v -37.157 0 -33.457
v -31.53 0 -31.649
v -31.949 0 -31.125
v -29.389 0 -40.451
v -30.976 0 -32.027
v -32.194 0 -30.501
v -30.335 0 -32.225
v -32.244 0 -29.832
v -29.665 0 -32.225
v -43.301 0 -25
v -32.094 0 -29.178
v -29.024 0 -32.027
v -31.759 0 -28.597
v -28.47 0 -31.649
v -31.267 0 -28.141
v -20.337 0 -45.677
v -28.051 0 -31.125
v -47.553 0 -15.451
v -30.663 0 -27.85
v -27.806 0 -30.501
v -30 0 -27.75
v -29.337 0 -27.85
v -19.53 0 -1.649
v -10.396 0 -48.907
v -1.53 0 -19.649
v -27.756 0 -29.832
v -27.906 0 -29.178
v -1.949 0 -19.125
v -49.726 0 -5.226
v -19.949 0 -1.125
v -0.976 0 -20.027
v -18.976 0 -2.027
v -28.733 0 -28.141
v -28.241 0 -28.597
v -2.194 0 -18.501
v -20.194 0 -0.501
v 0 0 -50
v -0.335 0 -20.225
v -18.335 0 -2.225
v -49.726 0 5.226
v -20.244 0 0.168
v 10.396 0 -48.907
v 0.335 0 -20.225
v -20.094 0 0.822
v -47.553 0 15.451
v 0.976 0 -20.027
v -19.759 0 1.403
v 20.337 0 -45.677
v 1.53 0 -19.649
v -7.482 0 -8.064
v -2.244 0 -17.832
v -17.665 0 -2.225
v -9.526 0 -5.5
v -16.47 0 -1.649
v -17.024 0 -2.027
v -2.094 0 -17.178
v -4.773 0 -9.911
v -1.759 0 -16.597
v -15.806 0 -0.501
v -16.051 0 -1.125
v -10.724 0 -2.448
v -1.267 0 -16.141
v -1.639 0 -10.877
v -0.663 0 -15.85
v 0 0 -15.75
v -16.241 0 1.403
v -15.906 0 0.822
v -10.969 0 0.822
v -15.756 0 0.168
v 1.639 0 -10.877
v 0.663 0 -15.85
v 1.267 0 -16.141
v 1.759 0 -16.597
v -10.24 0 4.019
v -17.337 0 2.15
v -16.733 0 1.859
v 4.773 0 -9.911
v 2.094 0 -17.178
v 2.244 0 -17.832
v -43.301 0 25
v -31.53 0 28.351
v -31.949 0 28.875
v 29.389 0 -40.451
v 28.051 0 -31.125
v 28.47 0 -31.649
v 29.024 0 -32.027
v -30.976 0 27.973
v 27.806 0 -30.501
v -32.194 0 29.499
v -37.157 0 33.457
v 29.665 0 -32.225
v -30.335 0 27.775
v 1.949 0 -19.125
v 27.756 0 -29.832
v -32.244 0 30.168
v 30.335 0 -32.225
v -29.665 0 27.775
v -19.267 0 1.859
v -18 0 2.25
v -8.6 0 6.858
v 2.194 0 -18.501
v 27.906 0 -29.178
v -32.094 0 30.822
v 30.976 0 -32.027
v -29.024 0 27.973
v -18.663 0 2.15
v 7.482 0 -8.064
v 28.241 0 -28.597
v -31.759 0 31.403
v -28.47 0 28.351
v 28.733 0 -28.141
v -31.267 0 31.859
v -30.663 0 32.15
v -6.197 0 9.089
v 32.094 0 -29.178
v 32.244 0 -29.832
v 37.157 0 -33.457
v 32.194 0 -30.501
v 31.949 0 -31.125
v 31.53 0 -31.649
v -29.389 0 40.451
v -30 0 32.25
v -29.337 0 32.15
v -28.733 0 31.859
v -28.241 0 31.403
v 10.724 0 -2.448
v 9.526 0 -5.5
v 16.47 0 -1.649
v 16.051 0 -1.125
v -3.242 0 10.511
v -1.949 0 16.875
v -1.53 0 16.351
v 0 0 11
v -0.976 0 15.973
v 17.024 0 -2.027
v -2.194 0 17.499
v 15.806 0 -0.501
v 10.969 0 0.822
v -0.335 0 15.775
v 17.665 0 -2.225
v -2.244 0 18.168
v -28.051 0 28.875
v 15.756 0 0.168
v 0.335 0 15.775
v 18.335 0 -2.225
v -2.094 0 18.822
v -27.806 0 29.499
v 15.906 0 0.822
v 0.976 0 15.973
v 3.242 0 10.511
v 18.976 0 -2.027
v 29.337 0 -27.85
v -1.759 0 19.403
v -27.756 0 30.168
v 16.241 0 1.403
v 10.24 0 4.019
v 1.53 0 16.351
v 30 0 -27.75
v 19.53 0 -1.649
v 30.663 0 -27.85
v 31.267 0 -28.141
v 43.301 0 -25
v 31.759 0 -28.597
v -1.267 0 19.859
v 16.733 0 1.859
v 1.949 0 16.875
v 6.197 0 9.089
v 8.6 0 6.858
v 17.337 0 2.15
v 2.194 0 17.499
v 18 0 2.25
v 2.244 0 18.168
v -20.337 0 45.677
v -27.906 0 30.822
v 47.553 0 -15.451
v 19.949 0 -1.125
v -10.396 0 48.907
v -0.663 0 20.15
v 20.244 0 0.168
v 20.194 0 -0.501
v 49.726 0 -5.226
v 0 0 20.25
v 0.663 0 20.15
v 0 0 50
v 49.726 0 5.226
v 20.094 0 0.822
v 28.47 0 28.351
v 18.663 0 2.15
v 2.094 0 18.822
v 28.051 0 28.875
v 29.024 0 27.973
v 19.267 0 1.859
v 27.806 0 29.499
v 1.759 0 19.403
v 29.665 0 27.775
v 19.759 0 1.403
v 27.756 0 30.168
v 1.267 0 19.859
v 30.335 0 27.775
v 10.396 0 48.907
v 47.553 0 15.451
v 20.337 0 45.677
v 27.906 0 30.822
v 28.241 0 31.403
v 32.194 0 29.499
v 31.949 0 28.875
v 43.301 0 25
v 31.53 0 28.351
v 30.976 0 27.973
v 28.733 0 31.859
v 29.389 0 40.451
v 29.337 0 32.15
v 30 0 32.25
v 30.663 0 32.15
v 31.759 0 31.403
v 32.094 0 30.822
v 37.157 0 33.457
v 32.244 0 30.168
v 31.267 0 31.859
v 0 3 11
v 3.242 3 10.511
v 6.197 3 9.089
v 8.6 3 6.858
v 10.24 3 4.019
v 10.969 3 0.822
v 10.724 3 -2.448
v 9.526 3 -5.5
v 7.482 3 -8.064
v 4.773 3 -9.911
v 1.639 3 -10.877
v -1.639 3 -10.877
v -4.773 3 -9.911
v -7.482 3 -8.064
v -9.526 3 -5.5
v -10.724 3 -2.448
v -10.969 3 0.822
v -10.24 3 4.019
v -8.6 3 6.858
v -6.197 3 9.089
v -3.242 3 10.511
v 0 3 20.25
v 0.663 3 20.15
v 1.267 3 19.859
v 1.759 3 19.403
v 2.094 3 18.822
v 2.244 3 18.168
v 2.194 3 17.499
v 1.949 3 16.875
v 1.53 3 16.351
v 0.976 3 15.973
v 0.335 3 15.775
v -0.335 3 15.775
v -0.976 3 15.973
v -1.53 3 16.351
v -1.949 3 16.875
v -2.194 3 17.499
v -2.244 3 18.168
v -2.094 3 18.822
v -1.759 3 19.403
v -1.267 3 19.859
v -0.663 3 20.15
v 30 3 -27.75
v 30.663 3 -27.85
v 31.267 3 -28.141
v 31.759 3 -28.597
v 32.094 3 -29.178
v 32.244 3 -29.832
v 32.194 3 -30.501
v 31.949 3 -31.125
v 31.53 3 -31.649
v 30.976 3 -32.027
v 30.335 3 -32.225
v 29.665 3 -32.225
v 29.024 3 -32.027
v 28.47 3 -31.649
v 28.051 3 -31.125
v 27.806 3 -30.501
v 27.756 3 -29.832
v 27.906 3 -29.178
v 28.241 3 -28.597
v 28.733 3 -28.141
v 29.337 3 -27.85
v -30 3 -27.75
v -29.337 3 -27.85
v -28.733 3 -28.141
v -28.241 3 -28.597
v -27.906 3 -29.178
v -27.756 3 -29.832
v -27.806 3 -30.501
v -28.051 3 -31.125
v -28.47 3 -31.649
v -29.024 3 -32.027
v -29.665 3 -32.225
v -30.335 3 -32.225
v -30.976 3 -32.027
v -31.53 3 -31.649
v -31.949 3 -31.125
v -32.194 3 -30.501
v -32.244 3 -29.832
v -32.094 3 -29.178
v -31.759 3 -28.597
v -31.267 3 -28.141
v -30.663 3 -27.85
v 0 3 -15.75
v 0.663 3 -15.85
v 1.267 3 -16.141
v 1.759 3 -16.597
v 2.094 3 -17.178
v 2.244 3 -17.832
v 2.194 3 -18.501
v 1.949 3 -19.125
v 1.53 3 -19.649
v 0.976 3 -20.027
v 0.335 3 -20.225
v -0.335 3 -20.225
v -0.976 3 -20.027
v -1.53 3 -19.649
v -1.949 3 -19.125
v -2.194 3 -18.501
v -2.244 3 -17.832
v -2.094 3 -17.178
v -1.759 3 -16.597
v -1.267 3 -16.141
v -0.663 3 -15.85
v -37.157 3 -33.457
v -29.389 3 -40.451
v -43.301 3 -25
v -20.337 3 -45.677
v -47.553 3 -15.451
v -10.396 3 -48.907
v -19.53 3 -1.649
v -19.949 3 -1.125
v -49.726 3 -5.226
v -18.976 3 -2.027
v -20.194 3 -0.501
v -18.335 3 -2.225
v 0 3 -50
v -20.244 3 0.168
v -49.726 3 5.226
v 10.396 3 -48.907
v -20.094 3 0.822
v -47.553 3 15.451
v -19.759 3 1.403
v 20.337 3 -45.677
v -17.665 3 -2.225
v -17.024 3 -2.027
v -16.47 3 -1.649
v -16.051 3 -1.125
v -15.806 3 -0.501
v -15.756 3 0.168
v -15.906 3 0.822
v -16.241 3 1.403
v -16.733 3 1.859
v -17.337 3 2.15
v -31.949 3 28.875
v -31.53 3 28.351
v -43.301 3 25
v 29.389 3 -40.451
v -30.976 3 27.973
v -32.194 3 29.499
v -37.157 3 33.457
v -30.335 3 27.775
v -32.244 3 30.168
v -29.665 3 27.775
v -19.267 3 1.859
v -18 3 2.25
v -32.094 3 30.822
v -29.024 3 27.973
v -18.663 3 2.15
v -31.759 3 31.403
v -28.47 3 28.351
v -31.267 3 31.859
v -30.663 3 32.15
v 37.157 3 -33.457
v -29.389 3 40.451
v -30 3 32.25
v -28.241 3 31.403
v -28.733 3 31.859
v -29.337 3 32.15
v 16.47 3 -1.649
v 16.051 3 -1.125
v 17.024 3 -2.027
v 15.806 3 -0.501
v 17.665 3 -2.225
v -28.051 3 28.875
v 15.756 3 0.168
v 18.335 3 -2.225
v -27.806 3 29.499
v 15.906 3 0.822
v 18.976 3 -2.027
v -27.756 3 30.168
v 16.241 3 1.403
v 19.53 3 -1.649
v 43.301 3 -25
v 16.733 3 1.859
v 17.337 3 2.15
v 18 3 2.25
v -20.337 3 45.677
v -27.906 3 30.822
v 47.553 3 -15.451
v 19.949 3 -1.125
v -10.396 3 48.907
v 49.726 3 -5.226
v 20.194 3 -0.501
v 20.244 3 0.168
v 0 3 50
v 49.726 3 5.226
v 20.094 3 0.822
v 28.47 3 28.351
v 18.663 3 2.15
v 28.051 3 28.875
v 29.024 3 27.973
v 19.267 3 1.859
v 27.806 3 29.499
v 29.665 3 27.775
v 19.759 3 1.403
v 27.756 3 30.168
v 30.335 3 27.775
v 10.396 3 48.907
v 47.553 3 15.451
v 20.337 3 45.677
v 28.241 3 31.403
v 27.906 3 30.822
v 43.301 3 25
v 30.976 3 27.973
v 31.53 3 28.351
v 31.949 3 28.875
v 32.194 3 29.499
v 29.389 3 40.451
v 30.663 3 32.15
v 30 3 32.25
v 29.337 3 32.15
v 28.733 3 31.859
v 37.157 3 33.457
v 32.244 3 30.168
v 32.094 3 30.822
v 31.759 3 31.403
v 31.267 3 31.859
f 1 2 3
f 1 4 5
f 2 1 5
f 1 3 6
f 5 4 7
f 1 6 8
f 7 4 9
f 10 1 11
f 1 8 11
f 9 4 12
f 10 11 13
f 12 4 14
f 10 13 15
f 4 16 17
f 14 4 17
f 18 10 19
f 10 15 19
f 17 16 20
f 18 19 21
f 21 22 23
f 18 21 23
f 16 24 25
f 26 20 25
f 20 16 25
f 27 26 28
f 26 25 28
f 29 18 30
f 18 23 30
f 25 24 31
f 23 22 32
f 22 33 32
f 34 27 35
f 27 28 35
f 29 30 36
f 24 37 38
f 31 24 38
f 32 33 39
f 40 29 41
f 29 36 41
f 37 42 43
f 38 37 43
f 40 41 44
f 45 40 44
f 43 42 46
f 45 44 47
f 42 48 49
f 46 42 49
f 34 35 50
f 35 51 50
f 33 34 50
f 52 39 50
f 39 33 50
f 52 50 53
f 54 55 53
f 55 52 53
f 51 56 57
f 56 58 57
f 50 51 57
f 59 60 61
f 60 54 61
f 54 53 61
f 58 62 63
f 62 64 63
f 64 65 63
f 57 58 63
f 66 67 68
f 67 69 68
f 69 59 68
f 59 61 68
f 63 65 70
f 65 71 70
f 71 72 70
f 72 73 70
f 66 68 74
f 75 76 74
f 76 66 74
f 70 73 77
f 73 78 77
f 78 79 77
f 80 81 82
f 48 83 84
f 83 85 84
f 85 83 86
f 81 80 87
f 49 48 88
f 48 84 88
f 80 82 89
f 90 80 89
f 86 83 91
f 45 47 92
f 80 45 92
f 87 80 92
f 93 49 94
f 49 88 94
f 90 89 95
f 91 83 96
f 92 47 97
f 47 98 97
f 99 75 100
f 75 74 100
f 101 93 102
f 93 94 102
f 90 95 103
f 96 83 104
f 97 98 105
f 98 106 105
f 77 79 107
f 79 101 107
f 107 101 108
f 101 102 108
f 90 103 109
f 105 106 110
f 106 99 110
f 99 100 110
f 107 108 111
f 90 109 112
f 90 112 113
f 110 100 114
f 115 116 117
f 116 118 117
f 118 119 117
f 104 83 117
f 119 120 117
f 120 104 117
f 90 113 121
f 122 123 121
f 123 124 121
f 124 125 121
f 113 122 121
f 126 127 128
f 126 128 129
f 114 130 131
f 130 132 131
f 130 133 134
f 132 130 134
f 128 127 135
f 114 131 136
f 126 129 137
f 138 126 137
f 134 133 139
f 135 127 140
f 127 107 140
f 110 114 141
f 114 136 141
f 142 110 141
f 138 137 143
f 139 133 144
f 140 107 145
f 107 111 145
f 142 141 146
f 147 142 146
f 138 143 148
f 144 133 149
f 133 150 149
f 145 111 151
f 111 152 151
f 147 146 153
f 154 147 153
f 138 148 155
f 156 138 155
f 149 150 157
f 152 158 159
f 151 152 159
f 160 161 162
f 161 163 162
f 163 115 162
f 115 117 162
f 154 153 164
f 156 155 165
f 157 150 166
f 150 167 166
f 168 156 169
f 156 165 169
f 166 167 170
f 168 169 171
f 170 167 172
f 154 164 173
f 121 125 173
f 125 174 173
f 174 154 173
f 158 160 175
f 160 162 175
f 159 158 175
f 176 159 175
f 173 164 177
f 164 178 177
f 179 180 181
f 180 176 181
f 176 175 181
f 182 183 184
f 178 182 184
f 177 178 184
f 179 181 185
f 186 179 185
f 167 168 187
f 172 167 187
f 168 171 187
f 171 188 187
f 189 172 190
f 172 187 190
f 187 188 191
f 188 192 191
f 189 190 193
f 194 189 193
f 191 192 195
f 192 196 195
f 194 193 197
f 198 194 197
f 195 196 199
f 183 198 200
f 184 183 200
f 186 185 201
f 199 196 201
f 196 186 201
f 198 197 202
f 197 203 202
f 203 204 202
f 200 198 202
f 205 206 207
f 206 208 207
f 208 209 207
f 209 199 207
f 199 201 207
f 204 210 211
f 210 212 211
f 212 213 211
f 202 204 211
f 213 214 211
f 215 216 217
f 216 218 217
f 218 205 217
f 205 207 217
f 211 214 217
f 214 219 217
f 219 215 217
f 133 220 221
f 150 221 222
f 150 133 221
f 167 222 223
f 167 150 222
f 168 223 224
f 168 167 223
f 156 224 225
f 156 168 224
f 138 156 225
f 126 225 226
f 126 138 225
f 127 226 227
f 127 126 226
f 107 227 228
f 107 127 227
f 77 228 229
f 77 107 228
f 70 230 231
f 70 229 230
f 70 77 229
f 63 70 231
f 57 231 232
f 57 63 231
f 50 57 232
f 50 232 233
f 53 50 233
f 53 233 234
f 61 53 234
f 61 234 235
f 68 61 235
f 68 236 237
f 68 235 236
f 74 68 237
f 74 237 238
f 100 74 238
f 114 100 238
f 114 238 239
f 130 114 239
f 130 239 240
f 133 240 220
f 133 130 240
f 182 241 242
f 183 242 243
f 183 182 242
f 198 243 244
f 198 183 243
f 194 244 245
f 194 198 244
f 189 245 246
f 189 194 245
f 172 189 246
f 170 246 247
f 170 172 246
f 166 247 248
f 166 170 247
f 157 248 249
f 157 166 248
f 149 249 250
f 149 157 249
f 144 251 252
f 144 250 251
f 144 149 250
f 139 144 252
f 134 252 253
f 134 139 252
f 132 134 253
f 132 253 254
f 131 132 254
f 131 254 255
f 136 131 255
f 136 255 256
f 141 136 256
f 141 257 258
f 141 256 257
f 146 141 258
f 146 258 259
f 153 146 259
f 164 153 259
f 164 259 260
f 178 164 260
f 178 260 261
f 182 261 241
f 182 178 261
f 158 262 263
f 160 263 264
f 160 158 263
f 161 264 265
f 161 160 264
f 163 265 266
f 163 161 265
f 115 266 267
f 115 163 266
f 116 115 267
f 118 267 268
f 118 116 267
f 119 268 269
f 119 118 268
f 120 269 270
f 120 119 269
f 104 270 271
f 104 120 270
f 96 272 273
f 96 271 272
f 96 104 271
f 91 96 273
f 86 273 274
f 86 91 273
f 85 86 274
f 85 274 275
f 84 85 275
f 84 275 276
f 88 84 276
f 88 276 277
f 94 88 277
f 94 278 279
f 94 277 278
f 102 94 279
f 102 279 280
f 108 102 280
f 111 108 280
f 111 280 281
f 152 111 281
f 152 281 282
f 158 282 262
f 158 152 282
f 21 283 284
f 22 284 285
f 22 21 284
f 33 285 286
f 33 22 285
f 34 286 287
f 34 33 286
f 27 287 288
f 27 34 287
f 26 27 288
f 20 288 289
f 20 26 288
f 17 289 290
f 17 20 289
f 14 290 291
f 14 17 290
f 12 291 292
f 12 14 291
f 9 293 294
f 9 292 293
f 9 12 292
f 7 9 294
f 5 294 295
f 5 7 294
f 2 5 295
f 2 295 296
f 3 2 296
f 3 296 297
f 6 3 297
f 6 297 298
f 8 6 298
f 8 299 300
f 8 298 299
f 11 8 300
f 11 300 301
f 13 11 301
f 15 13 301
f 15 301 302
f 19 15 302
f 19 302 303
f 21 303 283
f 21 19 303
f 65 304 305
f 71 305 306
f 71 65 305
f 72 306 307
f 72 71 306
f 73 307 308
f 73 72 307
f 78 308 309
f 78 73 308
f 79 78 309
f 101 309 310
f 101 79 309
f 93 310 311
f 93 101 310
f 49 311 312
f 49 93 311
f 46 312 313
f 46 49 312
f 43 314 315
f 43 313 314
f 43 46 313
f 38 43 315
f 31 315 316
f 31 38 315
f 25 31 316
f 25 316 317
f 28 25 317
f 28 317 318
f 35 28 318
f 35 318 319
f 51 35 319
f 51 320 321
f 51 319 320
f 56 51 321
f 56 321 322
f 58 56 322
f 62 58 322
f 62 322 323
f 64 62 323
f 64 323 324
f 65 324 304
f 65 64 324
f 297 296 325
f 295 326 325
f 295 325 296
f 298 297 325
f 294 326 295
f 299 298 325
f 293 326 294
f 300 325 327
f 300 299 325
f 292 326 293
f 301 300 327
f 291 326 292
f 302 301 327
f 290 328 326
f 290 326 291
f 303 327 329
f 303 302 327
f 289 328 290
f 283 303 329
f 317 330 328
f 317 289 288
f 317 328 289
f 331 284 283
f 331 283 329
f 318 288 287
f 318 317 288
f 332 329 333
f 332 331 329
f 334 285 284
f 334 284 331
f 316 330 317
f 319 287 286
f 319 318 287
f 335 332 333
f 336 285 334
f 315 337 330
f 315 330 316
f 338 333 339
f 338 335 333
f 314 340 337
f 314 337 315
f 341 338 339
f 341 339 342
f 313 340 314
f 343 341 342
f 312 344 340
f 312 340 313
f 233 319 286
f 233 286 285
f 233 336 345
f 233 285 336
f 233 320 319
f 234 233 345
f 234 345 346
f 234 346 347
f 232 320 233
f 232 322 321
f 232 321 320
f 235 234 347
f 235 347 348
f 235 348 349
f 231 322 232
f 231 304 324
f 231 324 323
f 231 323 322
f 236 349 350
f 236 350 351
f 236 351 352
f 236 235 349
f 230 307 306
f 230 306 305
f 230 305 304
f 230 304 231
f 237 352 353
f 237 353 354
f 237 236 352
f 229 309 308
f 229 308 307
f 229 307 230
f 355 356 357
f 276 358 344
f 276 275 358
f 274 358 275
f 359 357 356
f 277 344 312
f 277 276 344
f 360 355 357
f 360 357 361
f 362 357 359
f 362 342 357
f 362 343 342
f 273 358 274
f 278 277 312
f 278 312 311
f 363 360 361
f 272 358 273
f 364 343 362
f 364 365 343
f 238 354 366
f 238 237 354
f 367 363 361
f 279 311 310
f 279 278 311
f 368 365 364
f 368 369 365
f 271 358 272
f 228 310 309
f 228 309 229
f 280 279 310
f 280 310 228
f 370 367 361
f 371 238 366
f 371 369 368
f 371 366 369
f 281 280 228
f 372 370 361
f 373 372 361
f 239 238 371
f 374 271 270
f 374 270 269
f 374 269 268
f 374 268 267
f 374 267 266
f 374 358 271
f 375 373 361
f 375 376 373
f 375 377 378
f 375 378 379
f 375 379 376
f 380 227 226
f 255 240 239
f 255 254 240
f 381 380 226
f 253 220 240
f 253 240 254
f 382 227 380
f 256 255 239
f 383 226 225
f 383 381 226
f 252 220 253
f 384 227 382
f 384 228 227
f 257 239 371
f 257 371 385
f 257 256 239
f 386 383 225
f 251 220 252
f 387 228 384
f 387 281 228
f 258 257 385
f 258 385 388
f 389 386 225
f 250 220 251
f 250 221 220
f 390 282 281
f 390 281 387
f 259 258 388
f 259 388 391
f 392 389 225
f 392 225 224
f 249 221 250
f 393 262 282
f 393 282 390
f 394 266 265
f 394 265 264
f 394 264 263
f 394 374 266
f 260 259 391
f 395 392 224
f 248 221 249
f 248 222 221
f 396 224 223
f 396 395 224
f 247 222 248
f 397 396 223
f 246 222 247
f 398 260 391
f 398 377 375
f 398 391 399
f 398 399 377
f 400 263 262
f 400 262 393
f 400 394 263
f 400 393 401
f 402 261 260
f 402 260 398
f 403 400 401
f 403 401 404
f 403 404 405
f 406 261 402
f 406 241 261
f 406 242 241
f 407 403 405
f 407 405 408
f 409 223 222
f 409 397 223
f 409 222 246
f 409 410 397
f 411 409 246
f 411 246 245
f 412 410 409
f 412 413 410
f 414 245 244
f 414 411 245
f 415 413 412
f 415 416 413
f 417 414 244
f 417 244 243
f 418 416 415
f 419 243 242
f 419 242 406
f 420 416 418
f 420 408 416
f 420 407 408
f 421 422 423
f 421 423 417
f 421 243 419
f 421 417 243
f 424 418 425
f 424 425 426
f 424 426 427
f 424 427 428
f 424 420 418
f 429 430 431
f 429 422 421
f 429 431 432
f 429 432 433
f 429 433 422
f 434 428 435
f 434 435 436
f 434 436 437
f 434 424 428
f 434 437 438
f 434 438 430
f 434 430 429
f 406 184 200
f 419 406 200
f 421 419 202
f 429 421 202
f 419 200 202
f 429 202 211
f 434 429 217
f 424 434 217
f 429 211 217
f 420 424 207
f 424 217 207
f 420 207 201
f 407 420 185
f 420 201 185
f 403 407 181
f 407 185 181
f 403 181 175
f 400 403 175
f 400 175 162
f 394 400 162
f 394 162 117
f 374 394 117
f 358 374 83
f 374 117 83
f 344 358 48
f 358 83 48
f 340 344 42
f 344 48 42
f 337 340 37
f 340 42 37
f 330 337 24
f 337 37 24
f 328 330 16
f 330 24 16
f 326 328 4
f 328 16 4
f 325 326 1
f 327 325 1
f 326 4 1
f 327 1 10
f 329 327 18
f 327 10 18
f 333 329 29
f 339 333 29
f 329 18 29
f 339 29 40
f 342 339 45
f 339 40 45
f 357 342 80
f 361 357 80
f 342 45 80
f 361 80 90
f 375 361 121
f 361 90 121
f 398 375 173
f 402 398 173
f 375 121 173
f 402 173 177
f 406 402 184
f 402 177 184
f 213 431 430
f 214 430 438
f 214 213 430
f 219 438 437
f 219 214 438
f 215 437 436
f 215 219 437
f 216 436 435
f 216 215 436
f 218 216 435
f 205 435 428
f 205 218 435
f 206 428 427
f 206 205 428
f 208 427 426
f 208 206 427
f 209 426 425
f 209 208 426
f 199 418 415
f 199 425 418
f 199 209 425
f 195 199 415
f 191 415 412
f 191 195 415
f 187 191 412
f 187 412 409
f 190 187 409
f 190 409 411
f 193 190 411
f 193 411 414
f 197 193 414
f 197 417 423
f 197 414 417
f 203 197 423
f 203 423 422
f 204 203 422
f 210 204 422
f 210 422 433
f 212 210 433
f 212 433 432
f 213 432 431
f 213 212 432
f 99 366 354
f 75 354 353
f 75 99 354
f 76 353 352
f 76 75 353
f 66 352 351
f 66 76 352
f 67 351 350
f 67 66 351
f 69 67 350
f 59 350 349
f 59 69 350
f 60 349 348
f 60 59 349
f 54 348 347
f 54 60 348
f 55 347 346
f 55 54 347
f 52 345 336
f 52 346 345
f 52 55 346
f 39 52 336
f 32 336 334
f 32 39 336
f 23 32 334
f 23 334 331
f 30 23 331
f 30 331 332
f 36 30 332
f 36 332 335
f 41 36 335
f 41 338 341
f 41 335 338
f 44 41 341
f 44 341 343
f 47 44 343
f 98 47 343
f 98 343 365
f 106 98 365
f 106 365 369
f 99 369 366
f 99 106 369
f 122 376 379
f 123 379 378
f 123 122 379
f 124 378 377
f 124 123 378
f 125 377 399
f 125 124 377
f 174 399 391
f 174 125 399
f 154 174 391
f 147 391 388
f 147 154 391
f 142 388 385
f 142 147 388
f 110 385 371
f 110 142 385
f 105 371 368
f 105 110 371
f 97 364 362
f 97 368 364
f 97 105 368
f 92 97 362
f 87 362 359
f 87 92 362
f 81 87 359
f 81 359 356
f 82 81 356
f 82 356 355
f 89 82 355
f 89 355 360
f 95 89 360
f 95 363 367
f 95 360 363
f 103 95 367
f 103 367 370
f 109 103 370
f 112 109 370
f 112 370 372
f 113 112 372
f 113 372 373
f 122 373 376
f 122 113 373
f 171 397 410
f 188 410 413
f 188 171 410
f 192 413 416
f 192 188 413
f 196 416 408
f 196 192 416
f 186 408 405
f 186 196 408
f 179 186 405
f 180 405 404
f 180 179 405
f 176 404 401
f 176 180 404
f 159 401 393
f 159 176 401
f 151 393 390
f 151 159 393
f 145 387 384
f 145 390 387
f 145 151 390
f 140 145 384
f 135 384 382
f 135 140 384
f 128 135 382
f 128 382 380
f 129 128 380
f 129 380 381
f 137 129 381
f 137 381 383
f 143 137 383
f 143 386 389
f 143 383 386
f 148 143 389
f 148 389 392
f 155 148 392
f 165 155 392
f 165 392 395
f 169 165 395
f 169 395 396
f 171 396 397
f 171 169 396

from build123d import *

# Parameters (mm, degrees)
SKETCH_1_R          = 50
EXTRUDE_2_DEPTH     = 3
SKETCH_3_R          = 2.25
CUT_EXTRUDE_1_DEPTH = 71.774289117
SKETCH_4_R          = 11
CUT_EXTRUDE_2_DEPTH = 71.774289117


with BuildPart() as part:
    # 草图1 → 凸台-拉伸2 (new body)
    with BuildSketch(Plane(origin=(0, 0, 0), x_dir=(1, 0, 0), z_dir=(0, 1, 0))):
        with Locations(Location((0, 0, 0), (0, 0, 270))):
            Circle(SKETCH_1_R)
    extrude(amount=EXTRUDE_2_DEPTH)

    # 草图3 → 切除-拉伸1 (cut, through all)
    with BuildSketch(Plane(origin=(0, 0, 0), x_dir=(1, 0, 0), z_dir=(0, 1, 0))):
        with Locations(Location((-18, 0, 0), (0, 0, 270))):
            Circle(SKETCH_3_R)
        with Locations(Location((-30, 30, 0), (0, 0, 270))):
            Circle(SKETCH_3_R)
        with Locations(Location((30, 30, 0), (0, 0, 270))):
            Circle(SKETCH_3_R)
        with Locations(Location((30, -30, 0), (0, 0, 270))):
            Circle(SKETCH_3_R)
        with Locations(Location((-30, -30, 0), (0, 0, 270))):
            Circle(SKETCH_3_R)
        with Locations(Location((0, 18, 0), (0, 0, 270))):
            Circle(SKETCH_3_R)
        with Locations(Location((18, 0, 0), (0, 0, 270))):
            Circle(SKETCH_3_R)
        with Locations(Location((0, -18, 0), (0, 0, 270))):
            Circle(SKETCH_3_R)
    extrude(amount=CUT_EXTRUDE_1_DEPTH, mode=Mode.SUBTRACT)

    # 草图4 → 切除-拉伸2 (cut, through all)
    with BuildSketch(Plane(origin=(0, 0, 0), x_dir=(1, 0, 0), z_dir=(0, 1, 0))):
        with Locations(Location((0, 0, 0), (0, 0, 270))):
            Circle(SKETCH_4_R)
    extrude(amount=CUT_EXTRUDE_2_DEPTH, mode=Mode.SUBTRACT)


solid = part.part
